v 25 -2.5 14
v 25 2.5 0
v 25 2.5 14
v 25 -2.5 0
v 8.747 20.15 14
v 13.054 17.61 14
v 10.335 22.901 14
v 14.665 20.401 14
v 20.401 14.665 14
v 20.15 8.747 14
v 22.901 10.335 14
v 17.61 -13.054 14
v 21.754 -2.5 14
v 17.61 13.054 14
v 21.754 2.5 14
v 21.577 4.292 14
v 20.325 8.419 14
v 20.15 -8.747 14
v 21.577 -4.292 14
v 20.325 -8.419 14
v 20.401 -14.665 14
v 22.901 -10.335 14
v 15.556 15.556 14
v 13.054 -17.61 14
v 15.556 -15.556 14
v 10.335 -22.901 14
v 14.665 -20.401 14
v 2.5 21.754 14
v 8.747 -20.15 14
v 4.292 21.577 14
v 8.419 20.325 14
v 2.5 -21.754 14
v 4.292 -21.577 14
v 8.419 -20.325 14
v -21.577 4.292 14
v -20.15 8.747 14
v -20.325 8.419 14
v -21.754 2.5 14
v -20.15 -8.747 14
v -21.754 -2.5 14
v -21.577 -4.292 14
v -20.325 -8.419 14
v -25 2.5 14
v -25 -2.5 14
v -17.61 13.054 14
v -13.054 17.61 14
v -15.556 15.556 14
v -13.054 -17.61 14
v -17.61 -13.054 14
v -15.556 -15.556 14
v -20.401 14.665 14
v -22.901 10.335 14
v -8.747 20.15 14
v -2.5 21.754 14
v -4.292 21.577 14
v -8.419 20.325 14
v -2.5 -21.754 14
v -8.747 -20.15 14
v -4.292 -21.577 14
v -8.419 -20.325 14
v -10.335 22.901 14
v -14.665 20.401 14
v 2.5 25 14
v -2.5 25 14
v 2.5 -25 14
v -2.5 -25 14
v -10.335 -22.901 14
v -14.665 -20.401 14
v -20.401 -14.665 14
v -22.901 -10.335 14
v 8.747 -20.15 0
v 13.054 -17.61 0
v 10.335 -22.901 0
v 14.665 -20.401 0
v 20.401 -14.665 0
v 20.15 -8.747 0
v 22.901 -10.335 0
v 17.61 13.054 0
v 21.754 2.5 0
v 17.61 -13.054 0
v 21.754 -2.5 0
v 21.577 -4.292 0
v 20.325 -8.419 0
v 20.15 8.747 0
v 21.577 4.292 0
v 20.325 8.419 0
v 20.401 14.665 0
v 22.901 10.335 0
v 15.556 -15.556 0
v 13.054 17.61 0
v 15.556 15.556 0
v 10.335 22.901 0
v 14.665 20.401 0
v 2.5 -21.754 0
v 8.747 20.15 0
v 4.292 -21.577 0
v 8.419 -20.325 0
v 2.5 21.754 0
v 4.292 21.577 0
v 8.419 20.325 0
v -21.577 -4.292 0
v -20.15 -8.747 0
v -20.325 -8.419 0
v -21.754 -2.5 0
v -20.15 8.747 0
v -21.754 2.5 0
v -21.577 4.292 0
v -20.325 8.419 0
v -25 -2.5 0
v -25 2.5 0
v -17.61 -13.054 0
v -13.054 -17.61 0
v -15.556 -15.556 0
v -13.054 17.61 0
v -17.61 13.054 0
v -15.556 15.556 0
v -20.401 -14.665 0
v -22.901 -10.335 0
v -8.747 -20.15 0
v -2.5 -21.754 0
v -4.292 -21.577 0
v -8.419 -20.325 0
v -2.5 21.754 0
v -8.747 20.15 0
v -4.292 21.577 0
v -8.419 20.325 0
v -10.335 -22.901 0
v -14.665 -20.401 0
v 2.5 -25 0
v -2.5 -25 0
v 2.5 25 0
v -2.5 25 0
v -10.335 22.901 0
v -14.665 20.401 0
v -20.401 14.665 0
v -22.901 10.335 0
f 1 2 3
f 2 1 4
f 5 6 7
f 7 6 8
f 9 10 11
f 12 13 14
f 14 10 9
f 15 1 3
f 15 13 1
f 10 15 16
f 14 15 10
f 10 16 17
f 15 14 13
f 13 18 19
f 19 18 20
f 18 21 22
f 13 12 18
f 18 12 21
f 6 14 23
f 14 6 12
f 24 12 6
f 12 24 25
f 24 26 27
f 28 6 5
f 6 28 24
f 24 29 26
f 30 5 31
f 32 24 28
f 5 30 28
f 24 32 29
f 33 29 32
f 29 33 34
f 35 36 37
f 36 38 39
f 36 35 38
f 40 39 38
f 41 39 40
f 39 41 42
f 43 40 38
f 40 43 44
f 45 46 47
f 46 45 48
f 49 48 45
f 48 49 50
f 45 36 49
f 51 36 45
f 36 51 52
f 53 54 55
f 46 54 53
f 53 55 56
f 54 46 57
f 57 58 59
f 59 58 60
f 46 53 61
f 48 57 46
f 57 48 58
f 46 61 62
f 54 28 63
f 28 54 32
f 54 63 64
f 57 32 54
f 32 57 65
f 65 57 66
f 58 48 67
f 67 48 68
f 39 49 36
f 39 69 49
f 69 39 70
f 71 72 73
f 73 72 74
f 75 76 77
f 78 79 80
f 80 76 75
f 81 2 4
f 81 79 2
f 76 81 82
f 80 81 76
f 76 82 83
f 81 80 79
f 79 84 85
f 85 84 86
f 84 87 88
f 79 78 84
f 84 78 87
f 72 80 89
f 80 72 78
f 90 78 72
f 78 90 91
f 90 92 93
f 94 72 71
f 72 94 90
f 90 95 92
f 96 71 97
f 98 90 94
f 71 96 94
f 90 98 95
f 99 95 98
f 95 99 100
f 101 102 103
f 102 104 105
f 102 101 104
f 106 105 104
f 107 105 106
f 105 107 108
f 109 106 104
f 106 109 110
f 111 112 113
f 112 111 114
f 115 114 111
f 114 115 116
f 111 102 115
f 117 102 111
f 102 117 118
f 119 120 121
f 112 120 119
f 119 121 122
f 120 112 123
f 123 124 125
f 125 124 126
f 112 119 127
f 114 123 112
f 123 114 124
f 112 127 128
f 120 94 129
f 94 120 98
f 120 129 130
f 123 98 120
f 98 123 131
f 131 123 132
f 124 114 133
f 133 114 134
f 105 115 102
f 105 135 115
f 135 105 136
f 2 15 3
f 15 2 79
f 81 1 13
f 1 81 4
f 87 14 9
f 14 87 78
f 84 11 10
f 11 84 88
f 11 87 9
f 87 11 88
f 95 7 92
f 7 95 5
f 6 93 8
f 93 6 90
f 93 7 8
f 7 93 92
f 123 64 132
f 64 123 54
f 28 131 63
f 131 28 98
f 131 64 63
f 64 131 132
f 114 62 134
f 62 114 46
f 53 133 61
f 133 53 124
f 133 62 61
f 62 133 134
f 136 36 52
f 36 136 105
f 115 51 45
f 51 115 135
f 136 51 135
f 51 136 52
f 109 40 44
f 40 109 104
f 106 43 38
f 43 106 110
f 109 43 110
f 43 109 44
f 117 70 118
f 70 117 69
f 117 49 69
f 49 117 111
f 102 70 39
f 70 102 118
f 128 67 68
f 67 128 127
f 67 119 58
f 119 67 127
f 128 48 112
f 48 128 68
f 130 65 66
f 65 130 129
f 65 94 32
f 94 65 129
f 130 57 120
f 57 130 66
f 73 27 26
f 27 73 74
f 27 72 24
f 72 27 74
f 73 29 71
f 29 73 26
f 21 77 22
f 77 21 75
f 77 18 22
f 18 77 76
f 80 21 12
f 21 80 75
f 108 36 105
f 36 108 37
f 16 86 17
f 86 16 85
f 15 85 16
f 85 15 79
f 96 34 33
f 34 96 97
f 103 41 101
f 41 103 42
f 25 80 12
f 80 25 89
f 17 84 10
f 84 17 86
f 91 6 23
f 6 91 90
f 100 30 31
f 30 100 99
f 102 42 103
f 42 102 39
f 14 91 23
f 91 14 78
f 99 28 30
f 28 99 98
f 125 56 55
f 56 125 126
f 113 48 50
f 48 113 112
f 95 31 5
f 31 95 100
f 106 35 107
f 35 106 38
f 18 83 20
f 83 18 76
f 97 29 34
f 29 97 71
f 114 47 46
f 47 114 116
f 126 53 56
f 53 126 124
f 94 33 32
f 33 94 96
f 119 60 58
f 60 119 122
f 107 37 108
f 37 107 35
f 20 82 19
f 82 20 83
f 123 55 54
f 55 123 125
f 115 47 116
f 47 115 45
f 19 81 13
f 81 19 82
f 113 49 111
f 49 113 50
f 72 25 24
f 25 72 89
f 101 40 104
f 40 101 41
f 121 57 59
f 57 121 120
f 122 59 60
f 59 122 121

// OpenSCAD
$fn = 32;

// ----------------------------------------------------------------------
// Spur blank: plain gear blank
// ----------------------------------------------------------------------

// --- parameters (mm) ---
disc_r = 22;              // blank root radius
disc_t = 14;              // blank thickness
n_teeth = 12;             // stub tooth count
tooth_w = 5;              // tooth width at the root
tooth_h = 3;              // tooth height above the root

out_r = disc_r + tooth_h;  // tip radius
bbox_x = 50.0;  // measured width over the teeth
bbox_y = 50.0;  // measured depth over the teeth

union() {
  cylinder(r = disc_r, h = disc_t);
  for (i = [0 : n_teeth - 1])
    rotate([0, 0, i * 360 / n_teeth])
      translate([disc_r - 1, -tooth_w / 2, 0])
        cube([tooth_h + 1, tooth_w, disc_t]);
}
